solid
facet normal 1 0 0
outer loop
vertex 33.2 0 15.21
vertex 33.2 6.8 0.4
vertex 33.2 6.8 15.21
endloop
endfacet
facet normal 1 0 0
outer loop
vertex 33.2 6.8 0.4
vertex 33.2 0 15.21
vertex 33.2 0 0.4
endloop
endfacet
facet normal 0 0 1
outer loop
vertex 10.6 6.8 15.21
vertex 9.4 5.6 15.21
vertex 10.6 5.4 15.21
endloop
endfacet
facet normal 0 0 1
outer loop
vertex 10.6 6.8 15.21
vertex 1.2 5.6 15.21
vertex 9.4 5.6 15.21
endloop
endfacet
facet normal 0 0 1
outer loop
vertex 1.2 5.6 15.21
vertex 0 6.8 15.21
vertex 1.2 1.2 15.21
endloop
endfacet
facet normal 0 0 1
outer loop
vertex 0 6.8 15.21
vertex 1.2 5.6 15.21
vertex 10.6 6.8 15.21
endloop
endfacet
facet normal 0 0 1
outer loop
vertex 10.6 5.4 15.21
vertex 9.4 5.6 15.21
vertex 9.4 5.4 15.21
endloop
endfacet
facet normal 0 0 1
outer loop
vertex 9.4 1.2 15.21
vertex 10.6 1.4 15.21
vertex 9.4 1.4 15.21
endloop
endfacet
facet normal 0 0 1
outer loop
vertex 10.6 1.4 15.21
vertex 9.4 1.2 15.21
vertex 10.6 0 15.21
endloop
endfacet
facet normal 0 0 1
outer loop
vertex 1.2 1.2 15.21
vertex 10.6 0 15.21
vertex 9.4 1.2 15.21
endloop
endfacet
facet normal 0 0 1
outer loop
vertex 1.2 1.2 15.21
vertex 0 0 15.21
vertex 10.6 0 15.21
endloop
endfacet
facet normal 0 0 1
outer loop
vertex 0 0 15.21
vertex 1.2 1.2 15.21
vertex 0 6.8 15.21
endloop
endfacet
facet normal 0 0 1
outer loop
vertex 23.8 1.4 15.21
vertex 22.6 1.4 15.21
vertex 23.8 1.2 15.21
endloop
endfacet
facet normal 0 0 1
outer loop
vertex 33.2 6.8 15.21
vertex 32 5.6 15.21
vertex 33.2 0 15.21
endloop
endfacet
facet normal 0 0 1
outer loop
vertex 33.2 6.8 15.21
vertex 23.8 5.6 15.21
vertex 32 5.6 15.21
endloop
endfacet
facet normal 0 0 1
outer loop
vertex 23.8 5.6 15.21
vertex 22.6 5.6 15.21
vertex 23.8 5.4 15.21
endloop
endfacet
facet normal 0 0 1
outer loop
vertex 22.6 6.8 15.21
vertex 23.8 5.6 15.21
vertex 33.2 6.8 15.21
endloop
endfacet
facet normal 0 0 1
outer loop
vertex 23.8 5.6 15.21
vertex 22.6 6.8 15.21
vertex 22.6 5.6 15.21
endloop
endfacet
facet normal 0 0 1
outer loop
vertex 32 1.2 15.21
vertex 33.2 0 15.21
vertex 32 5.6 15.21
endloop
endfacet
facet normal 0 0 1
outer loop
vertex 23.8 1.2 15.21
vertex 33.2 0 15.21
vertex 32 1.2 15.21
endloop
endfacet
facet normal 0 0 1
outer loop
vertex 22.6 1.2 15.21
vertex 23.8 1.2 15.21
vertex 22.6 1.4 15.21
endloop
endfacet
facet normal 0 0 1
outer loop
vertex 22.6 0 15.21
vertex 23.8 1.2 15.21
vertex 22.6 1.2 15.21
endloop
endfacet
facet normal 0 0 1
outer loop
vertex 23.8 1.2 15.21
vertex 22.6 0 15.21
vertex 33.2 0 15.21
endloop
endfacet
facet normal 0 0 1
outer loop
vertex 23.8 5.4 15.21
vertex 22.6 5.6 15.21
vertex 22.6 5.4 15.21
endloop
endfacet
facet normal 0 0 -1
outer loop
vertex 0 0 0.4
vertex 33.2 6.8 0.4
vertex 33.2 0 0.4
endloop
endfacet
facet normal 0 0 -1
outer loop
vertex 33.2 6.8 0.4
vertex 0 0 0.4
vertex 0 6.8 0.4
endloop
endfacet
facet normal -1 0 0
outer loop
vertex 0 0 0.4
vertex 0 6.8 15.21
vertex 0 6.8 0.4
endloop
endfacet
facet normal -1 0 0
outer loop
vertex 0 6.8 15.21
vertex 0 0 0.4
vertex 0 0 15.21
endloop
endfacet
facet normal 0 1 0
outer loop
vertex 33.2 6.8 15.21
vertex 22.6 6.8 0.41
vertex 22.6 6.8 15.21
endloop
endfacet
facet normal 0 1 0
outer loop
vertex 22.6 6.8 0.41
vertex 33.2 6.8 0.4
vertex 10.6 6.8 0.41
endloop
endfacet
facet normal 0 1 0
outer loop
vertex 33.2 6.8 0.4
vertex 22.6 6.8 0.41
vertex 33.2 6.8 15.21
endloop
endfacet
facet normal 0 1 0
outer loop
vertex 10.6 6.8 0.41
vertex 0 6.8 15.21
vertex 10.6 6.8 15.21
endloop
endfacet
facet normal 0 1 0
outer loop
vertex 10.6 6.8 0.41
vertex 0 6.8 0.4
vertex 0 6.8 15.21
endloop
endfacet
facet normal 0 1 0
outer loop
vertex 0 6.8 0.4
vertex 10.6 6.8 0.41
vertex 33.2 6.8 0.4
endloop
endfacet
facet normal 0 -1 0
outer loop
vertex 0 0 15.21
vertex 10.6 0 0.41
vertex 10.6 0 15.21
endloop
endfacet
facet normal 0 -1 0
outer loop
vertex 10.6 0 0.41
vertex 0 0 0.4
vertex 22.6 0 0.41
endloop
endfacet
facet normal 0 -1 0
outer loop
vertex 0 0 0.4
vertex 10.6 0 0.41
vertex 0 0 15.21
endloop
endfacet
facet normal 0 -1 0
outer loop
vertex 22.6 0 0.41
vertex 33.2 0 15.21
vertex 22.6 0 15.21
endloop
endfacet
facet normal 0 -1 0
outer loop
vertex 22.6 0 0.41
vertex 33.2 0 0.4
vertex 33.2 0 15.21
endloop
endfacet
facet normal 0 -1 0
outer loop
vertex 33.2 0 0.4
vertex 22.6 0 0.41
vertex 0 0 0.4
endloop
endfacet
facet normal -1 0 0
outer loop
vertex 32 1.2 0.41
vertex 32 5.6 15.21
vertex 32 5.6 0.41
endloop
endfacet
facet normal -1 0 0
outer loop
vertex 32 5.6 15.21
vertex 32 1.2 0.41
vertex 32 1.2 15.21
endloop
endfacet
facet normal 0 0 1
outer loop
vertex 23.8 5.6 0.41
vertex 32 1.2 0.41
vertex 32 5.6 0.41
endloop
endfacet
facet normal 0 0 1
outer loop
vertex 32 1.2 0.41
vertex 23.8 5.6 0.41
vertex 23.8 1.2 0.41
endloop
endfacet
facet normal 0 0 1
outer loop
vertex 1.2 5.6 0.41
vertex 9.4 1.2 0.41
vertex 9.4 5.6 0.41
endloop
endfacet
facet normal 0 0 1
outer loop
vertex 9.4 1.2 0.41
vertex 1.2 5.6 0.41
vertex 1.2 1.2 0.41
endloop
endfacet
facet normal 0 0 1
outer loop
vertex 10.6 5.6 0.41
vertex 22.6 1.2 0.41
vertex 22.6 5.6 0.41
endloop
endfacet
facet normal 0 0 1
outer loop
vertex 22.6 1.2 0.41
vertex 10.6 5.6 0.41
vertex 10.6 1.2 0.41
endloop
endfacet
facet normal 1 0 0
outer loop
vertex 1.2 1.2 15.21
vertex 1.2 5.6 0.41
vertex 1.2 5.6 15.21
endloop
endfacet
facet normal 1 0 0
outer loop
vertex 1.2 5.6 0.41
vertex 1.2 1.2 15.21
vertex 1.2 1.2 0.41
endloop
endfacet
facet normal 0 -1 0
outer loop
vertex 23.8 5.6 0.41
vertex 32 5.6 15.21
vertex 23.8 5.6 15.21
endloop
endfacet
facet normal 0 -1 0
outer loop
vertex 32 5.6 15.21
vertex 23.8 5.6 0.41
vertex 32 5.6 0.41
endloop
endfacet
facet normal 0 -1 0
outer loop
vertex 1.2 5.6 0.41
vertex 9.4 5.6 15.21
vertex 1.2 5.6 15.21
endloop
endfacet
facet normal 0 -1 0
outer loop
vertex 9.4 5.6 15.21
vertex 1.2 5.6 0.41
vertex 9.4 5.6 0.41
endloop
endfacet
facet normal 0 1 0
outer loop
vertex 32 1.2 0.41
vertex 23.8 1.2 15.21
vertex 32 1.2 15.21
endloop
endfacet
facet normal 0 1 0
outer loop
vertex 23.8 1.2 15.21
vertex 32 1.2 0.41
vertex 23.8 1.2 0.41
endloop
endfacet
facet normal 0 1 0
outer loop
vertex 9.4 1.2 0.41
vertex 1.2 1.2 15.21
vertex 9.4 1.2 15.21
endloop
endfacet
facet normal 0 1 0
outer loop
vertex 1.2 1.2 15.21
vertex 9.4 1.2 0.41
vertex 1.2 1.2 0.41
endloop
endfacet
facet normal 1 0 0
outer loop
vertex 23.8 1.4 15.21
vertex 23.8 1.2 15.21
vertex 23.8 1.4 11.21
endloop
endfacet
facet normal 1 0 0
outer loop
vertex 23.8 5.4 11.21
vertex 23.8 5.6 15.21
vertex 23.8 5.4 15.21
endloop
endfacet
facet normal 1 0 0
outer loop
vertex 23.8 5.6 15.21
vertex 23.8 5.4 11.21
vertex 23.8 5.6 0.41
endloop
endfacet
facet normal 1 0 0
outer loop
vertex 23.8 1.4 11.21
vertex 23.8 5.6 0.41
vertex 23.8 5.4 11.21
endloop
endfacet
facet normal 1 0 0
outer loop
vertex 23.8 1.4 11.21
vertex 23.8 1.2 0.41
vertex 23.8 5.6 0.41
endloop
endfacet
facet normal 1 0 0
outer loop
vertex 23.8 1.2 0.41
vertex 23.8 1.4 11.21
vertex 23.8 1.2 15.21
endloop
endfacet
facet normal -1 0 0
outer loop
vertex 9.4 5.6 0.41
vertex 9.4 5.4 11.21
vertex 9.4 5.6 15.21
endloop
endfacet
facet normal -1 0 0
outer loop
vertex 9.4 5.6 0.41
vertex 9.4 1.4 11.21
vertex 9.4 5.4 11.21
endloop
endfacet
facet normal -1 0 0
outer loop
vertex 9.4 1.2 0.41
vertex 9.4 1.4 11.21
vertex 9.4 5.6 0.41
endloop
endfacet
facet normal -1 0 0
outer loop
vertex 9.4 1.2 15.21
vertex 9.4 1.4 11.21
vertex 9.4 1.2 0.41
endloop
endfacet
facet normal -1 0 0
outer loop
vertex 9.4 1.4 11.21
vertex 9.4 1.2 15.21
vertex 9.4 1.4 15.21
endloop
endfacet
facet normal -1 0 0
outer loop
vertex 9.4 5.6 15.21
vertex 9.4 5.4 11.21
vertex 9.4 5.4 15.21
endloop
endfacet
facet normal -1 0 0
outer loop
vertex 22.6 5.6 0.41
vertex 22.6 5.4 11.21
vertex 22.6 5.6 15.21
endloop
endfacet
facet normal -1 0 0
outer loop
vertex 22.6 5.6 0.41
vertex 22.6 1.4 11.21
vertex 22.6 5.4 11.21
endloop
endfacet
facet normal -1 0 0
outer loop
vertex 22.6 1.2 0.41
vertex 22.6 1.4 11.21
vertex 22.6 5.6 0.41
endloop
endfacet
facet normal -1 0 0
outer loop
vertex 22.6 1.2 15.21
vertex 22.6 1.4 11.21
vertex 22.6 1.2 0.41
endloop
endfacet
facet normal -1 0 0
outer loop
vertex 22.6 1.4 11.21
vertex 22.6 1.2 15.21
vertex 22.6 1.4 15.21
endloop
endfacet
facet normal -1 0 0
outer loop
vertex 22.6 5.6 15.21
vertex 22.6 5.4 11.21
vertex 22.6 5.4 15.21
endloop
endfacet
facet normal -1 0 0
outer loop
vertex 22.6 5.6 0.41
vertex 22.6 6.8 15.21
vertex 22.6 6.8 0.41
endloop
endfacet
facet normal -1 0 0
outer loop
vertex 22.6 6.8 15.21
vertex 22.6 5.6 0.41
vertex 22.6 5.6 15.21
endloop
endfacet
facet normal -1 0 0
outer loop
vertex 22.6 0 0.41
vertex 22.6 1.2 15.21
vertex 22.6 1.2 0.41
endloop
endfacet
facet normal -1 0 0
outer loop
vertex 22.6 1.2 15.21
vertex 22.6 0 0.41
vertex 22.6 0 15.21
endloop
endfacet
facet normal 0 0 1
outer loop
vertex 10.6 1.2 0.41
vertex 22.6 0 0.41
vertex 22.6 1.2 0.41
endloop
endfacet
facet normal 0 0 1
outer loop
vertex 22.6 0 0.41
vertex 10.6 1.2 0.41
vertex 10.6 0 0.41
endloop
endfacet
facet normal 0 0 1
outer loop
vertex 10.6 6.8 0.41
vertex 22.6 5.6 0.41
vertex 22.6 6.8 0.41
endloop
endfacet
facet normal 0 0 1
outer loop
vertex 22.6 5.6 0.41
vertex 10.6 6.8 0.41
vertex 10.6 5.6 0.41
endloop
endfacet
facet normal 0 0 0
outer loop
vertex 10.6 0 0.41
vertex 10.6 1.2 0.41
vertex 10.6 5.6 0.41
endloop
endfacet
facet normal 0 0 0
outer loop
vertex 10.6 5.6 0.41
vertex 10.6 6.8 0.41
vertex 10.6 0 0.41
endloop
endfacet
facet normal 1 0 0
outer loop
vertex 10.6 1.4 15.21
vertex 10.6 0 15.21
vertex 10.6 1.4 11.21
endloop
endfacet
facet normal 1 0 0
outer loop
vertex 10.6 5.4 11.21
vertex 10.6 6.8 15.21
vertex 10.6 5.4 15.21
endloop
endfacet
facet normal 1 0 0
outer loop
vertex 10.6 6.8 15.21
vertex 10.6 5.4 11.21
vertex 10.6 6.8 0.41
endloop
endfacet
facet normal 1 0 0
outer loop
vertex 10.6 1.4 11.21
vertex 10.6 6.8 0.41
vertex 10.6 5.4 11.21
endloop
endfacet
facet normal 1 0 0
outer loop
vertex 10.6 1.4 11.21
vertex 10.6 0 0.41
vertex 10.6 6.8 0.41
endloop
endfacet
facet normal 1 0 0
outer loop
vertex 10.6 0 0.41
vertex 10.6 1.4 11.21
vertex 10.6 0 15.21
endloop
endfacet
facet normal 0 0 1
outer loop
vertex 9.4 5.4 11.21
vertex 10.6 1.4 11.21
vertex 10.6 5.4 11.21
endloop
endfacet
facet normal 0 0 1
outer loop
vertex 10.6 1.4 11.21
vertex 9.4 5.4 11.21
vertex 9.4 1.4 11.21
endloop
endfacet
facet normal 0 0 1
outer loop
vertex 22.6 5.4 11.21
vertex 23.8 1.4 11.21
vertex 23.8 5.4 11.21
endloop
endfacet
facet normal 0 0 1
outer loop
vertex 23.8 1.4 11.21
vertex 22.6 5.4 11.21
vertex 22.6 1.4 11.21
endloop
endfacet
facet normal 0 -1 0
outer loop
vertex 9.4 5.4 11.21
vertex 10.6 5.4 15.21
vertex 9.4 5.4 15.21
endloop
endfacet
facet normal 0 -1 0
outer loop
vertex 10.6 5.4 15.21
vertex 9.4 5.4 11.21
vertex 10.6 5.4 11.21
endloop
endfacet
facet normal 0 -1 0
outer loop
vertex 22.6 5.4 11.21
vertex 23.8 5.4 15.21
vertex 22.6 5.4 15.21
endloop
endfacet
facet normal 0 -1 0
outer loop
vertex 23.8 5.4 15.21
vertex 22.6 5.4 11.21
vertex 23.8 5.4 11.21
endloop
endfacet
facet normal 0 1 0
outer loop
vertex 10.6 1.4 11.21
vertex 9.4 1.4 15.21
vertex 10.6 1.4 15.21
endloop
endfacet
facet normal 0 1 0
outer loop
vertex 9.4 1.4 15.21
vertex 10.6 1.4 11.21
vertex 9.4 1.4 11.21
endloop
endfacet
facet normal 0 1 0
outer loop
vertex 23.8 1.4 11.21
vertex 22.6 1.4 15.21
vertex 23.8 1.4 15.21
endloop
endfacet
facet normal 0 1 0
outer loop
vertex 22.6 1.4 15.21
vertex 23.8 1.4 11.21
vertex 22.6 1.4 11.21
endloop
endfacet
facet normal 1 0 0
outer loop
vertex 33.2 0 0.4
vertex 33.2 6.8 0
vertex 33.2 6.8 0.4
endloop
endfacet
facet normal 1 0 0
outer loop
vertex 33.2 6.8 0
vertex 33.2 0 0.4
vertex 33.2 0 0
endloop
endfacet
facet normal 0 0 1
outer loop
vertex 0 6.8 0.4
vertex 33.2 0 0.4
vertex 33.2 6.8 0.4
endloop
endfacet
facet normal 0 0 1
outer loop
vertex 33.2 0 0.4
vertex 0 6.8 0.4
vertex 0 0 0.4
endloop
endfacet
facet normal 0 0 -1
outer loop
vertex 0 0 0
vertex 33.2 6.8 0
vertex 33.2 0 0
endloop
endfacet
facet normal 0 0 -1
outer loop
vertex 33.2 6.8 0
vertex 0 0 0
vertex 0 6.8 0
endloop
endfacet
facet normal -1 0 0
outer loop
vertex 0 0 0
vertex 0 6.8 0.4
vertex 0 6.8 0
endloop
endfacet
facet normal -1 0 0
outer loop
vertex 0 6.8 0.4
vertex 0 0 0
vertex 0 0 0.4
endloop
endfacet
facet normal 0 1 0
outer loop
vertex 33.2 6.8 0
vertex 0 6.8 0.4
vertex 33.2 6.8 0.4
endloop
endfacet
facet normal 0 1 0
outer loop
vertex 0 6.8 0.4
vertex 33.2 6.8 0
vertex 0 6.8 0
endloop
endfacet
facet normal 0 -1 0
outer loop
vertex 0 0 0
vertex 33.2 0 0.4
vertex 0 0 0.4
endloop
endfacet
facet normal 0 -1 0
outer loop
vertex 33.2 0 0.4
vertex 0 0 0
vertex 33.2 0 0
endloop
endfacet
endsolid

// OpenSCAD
// file: ../../Base/Boxes.scad
// Fischertechnik Box Foundation
// Pre-designed Boxes

use <Constants.scad>

include <PlacementOptions.scad>

box190Width = 190;
box190Depth = 130;
box130Width = 130;
box130Depth = 95;
boxUsageHeight = 33.9;
boxWallThickness = 2.4;
boxBaseThickness = 1.0;
boxWebWidth = 3.0;

// getBoxWallThickness()
// Gets the wall thickness of a Fischertechnik Box

function getBoxWallThickness() = boxWallThickness;

// Gets the usable height of a fischertechnik box
function getBoxUsageHeight() = boxUsageHeight;

// Gets the thickness of the Fischertechnik box base.
function getBoxBaseThickness() = boxBaseThickness;

// Gets the width of a box web
function getBoxWebWidth() = boxWebWidth;

// Gets the usable inner space of a Box 190 as an x/y-list
function getBox190Space() = [
    box190Width - 2*getBoxWallThickness(), 
    box190Depth - 2*getBoxWallThickness() ];

// Imports the Fischertechnik empty box 130x190 mm and places it at position 0,0
// 190x130 are the outer sizes, the inner space is slightly smaller. Use getBox190Space() to get the inner sizes.
// This module needs the STL file "Fischertechnik Box 130x190.stl" in the library path.
// The box is positioned that the usable inner space is at the 0,0,0 position. The

module Box190() {
    translate([-getBoxWallThickness(),-getBoxWallThickness(),-getBoxBaseThickness()])
        import("Fischertechnik Box 130x190.stl", convexity=3);
}

// Gets the usable inner space of a Box 130 as an x/y-list
function getBox130Space() = [
    box130Width - 2*getBoxWallThickness(), 
    box130Depth - 2*getBoxWallThickness() ];

// Imports the Fischertechnik empty box 95x130 mm and places it at position 0,0
// 190x130 are the outer sizes, the inner space is slightly smaller. Use getBox190Space() to get the inner sizes.
// This module needs the STL file "Fischertechnik Box 95x130.stl" in the library path.
// The box is positioned that the usable inner space is at the 0,0,0 position. The

module Box130() {
    translate([-getBoxWallThickness(),-getBoxWallThickness(),-getBoxBaseThickness()])
        import("Fischertechnik Box 95x130.stl", convexity=3);
}

// Creates a web at the specified box walls
// corner 0 = LowerLeft, 1 = UpperLeft, 2 = UpperRight, 3 = LowerRight
// side 0 = LeftOfCorner, 1 = RightOfCorner
// distance = Distance in mm from the corner
// box = inner width and depth of the box (default: Box 190)
// webWidth = length of the web (default is 3 mms)
// webThickness = thickness of the web (default is 1 mm)

module BoxWeb(corner, side, distance, box=getBox190Space(), webWidth=getBoxWebWidth(), webThickness=1.0) {
    sink = getBoxWallThickness()/2;

    width = (corner % 2 == 0) ? 
            (side == LeftOfCorner ? webWidth : webThickness) :
            (side == LeftOfCorner ? webThickness : webWidth);

    depth = (corner % 2 == 0) ? 
            (side == RightOfCorner ? webWidth : webThickness) :
            (side == RightOfCorner ? webThickness : webWidth);
    
    xDiff = corner == LowerLeft ? 
                (side == LeftOfCorner ? -sink : distance) :
            (corner == UpperLeft ?                
                (side == LeftOfCorner ? distance : -sink) :
            (corner == UpperRight ?
                (side == LeftOfCorner ? box.x-webWidth+sink : box.x-distance-webThickness) :
                (side == LeftOfCorner ? box.x-distance-webThickness: box.x-webWidth+sink)));

    yDiff = corner == LowerLeft ? 
                (side == RightOfCorner ? -sink : distance) :
            (corner == UpperLeft ?
                (side == RightOfCorner ? box.y-distance : box.y-webWidth+sink) :
            (corner == UpperRight ?
                (side == RightOfCorner ? box.y-webWidth+sink : box.y-distance) :
                (side == RightOfCorner ? distance : -sink)));
    
    translate([xDiff, yDiff, -getExcess()])
        cube([width, depth, boxUsageHeight + 2*getExcess()]);
}
// file: ../../Base/Rotation.scad
// Fischertechnik Box Foundation
// Geometry Helpers Rotation

include <PlacementOptions.scad>

// getRotatedSpace(space, rotation=NoRotation)
// Rotates the space dependent on the specified rotation

function getRotatedSpace(space, rotation=NoRotation) = [
    (rotation == Rotate90 || rotation == Rotate270) ? space.y : space.x,
    (rotation == Rotate90 || rotation == Rotate270) ? space.x : space.y
];

// Rotates the given space around the fixed left lower corner
// space = the space the children needs as width/depth list [width,depth]
// rotation = 0 Rotate0 degrees, 1 Rotate90 degrees, 2 Rotate180 degrees, 3 Rotate270 degrees (equivalent to -90)

module RotateFix(space, rotation=Rotate0) {
    dy = (rotation == Rotate0 || rotation == Rotate270) ? 0 :
        (rotation == Rotate90) ? space.x :
        space.y;
    dx = (rotation < Rotate180) ? 0 :
        (rotation == Rotate180) ? space.x :
        space.y;
    
    translate([dx, dy, 0])
        rotate([0, 0, rotations[rotation]])
            children();
}
// file: ../../Base/Alignment.scad
// Fischertechnik Box Foundation
// Geometry Helpers Alignment

include <PlacementOptions.scad>

// getAlignedX(elementWidth, spaceWidth, align=AlignRight, offset=0)
// Gets the aligned X offset of an element with the given
// width in the given space.
// elementWidth = The width of the element to positon
// spaceWidth = The space where the element should be aligned
// align = 0 AlignLeft, 1 AlignCenter, 2 AlignRight
// offset = an optional offset from the aligned position. When
// aligned left or centered, then positive values are in X direction.
// When aligned right then positive values are in negative X direction.

function getAlignedX(elementWidth, spaceWidth, align=AlignRight, offset=0) =
    (align == AlignLeft) ?
        offset :
        ((align == AlignCenter) ?
        (spaceWidth - elementWidth)/2 + offset :
        spaceWidth - offset - elementWidth);

// getAlignedY(elementDepth, spaceDepth, align=AlignTop, offset=0)
// Gets the aligned Y offset of an element with the given
// depth in the given space.
// elementDepth = The depth of the element to positon
// spaceDepth = The space where the element should be aligned
// align = 0 AlignBottom, 1 AlignCenter, 2 AlignTop
// offset = an optional offset from the aligned position. When
// aligned bottom or centered, then positive values are in Y direction.
// When aligned top then positive values are in negative Y direction.

function getAlignedY(elementDepth, spaceDepth, align=AlignTop, offset=0) =
    (align == AlignBottom) ?
        offset :
        ((align == AlignCenter) ?
        (spaceDepth - elementDepth)/2 + offset :
        spaceDepth - offset - elementDepth);
// file: ../../Base/PlacementOptions.scad
// Fischertechnik Box Foundation
// Placement Options

// Alignment
NoAlign = 0;
AlignLeft = 1;
AlignBottom = 2;
AlignCenter = 3;
AlignRight = 4;
AlignTop = 5;

// Element rotation degree steps
rotations = [0, -90, -180, -270];

// Rotation
NoRotation = 0;
Rotate0 = 0;
Rotate90 = 1;
Rotate180 = 2;
Rotate270 = 3;

// Docking (seen from above)
NoDock = -1;
DockLeft = 0;
DockTop = 1;
DockRight = 2;
DockCorner = 2;
DockBottom = 3;

// Web corners
LowerLeft = 0;
UpperLeft = 1;
UpperRight = 2;
LowerRight = 3;

// Web position relative to corner
LeftOfCorner = 0;
RightOfCorner = 1;
// file: ../../Base/Placement.scad
// Fischertechnik Box Foundation
// Geometry Helpers Placement

use <Constants.scad>
use <Alignment.scad>
use <Rotation.scad>
use <Boxes.scad>

include <PlacementOptions.scad>

// Place(x=0, y=0, elementSpace=[0,0], alignX=AlignLeft, alignY=AlignBottom, rotation=Rotate0, boxSpace=getBox190Space())
// Places the child at the specified position
// y = Y-Position. This is a relative position when an X aligment is specified.
// x = X-Position. This is a relative position when an Y aligment is specified.
// elementSpace = space of the element to be placed [x,y]
// alignX = -1=NoAlign, 0 AlignLeft, 1 AlignCenter, 3 AlignRight (elementSpace and boxSpace required!)
// alignY = -1=NoAlign, 2 AlignBottom, 1 AlignCenter, 4 AlignTop (elementSpace and boxSpace required!)
// rotation = 0 Rotate0 0 degrees, 1 Rotate90 90 degrees, 
// 2 Rotate180 180 degrees, 3 Rotate270 270 degrees (equivalent to -90)
// boxSpace = Inner space of the box where the placement occurs [x,y] - default is Box 190x130 inner space

module Place(x=0, y=0, elementSpace=[0,0], 
  alignX=AlignLeft, alignY=AlignBottom, 
  rotation=NoRotation, boxSpace=getBox190Space()) {

    module Position(x, y, space, rotation=Rotate0) {
        translate([x, y, 0])
            RotateFix(space, rotation)
                children();
    }

    space = getRotatedSpace(elementSpace, rotation);
    alignedX = getAlignedX(space.x, boxSpace.x, alignX, x);
    alignedY = getAlignedY(space.y, boxSpace.y, alignY, y);
    Position(alignedX, alignedY, elementSpace, rotation)
        children();
}

// Center(space=getBox130Space(), elementSpace=[0,0])
// space = Space where the children is centered. For cylinder use centered=true and no elementSpace.
// elementSpace = space of the element to be centered [x,y]

module Center(space=getBox190Space(), elementSpace=[0,0]) {
    translate([(space.x - elementSpace.x) / 2, (space.y - elementSpace.y) / 2])
        children(0);
}

// CenterHorizontal(width=0, y=0, offset=0, space=getBox130Space())
// space = Space where the children is centered. For cylinder use centered=true and no elementSpace.
// elementSpace = space of the element to be centered [x,y]

module CenterHorizontal(width=0, y=0, offset=0, space=getBox190Space()) {
    translate([(space.x - width) / 2 + offset, y])
        children(0);
}

// CenterVertical(depth=0, x=0, offset=0, space=getBox130Space())
// space = Space where the children is centered. For cylinder use centered=true and no elementSpace.
// elementSpace = space of the element to be centered [x,y]

module CenterVertical(depth=0, x=0, offset=0, space=getBox190Space()) {
    translate([x, (space.y - depth) / 2 + offset])
        children(0);
}
// file: ../../Elements/AxisClip10.scad
// Fischertechnik Box Library
// Axis for clip 10
// 31023

use <../ModelBase/Simple.scad>

width = 12;
depth = 12;
height = 23;

// getAxisClip10Space()
// Gets the space of a frame for a clip 10 with spring ring (mot2)

function getAxisClip10Space() = [width, depth, height];

// AxisClip10()
// Axis for clip 10 with spring ring (mot2)

module AxisClip10() {
    LeveledAxisWithSpace(height, height-10, getAxisClip10Space());
}

// Tests
color("lightgray")
AxisClip10();
// file: ../../Base/Constants.scad
// Fischertechnik Box Foundation
// Constants

// Constant values necessary for multiple elements

// Base constants
dividerThickness = 1.2;
excess = 0.01;
fragments = 90;
tolerance = 0.8;

// Gets the thickness of a divider 
function getDividerThickness() = dividerThickness;

// Gets the excess that is used to merge walls into each other
function getExcess() = excess;

// Gets amount of fragments of a cylinder
function getFragments() = fragments;

// Gets the inner tolerance of a frame to each side
function getTolerance() = tolerance;


// Fischertechnik specific constants
axisDiameter = 4;
axisBottomDiameter = axisDiameter + 1;
standardEdgeDistance = 2.5;
standardWebDistance = 11.5;
standardCornerLength = 15;
tubeWallFactor = 0.8;

// Gets axis diameter
function getAxisDiameter() = axisDiameter;

// Gets axis bottom diameter for thicker part at the bottom
function getAxisBottomDiameter() = axisBottomDiameter;

// gets the standard distance to the wall of the box for dockable frames with webs
function getStandardEdgeDistance() = standardEdgeDistance;

// gets the standard distance of each web to the corner of the dockable frame
function getStandardWebDistance() = standardWebDistance;

// gets the standard length of the corner walls of a dockable frame
function getStandardCornerLength() = standardCornerLength;

// gets the wall thickness of a tube.
function getTubeWallThickness() = tubeWallFactor * getDividerThickness();
// file: ../../Elements/FrameAxis30.scad
// Fischertechnik Box Library
// Frame for single 30 mm Axis
// 31034
// For standing axis see CylinderAxis30

use <../ModelBase/Complex.scad>

length = 30;

// getFrameAxis30Space()
// Gets the width (.x) and depth (.y) of the axis frame.

function getFrameAxis30Space() = getFrameAxisSpace(length);

// FrameAxis30()
// Axis holder for a single 30 mm axis.
// For standing axis see CylinderAxis30

module FrameAxis30() {
    FrameAxis(length);
}

// Test
color("lightgray")
FrameAxis30();
// file: ../TestPrint.scad
// 3D Print Test Base

use <../Base/Constants.scad>

use <../Elements/AxisClip10.scad>

module TestPrint(elementSpace) {
    cube([elementSpace.x, elementSpace.y, 0.4]);
    translate([0,0,0.4+getExcess()]) {
        children();
    }
}

TestPrint(getAxisClip10Space())
    AxisClip10();
// main file
// 3D Print Test Base
// FrameAxis30

use <../TestPrint.scad>
use <../../Elements/FrameAxis30.scad>

TestPrint(getFrameAxis30Space())
    FrameAxis30();
